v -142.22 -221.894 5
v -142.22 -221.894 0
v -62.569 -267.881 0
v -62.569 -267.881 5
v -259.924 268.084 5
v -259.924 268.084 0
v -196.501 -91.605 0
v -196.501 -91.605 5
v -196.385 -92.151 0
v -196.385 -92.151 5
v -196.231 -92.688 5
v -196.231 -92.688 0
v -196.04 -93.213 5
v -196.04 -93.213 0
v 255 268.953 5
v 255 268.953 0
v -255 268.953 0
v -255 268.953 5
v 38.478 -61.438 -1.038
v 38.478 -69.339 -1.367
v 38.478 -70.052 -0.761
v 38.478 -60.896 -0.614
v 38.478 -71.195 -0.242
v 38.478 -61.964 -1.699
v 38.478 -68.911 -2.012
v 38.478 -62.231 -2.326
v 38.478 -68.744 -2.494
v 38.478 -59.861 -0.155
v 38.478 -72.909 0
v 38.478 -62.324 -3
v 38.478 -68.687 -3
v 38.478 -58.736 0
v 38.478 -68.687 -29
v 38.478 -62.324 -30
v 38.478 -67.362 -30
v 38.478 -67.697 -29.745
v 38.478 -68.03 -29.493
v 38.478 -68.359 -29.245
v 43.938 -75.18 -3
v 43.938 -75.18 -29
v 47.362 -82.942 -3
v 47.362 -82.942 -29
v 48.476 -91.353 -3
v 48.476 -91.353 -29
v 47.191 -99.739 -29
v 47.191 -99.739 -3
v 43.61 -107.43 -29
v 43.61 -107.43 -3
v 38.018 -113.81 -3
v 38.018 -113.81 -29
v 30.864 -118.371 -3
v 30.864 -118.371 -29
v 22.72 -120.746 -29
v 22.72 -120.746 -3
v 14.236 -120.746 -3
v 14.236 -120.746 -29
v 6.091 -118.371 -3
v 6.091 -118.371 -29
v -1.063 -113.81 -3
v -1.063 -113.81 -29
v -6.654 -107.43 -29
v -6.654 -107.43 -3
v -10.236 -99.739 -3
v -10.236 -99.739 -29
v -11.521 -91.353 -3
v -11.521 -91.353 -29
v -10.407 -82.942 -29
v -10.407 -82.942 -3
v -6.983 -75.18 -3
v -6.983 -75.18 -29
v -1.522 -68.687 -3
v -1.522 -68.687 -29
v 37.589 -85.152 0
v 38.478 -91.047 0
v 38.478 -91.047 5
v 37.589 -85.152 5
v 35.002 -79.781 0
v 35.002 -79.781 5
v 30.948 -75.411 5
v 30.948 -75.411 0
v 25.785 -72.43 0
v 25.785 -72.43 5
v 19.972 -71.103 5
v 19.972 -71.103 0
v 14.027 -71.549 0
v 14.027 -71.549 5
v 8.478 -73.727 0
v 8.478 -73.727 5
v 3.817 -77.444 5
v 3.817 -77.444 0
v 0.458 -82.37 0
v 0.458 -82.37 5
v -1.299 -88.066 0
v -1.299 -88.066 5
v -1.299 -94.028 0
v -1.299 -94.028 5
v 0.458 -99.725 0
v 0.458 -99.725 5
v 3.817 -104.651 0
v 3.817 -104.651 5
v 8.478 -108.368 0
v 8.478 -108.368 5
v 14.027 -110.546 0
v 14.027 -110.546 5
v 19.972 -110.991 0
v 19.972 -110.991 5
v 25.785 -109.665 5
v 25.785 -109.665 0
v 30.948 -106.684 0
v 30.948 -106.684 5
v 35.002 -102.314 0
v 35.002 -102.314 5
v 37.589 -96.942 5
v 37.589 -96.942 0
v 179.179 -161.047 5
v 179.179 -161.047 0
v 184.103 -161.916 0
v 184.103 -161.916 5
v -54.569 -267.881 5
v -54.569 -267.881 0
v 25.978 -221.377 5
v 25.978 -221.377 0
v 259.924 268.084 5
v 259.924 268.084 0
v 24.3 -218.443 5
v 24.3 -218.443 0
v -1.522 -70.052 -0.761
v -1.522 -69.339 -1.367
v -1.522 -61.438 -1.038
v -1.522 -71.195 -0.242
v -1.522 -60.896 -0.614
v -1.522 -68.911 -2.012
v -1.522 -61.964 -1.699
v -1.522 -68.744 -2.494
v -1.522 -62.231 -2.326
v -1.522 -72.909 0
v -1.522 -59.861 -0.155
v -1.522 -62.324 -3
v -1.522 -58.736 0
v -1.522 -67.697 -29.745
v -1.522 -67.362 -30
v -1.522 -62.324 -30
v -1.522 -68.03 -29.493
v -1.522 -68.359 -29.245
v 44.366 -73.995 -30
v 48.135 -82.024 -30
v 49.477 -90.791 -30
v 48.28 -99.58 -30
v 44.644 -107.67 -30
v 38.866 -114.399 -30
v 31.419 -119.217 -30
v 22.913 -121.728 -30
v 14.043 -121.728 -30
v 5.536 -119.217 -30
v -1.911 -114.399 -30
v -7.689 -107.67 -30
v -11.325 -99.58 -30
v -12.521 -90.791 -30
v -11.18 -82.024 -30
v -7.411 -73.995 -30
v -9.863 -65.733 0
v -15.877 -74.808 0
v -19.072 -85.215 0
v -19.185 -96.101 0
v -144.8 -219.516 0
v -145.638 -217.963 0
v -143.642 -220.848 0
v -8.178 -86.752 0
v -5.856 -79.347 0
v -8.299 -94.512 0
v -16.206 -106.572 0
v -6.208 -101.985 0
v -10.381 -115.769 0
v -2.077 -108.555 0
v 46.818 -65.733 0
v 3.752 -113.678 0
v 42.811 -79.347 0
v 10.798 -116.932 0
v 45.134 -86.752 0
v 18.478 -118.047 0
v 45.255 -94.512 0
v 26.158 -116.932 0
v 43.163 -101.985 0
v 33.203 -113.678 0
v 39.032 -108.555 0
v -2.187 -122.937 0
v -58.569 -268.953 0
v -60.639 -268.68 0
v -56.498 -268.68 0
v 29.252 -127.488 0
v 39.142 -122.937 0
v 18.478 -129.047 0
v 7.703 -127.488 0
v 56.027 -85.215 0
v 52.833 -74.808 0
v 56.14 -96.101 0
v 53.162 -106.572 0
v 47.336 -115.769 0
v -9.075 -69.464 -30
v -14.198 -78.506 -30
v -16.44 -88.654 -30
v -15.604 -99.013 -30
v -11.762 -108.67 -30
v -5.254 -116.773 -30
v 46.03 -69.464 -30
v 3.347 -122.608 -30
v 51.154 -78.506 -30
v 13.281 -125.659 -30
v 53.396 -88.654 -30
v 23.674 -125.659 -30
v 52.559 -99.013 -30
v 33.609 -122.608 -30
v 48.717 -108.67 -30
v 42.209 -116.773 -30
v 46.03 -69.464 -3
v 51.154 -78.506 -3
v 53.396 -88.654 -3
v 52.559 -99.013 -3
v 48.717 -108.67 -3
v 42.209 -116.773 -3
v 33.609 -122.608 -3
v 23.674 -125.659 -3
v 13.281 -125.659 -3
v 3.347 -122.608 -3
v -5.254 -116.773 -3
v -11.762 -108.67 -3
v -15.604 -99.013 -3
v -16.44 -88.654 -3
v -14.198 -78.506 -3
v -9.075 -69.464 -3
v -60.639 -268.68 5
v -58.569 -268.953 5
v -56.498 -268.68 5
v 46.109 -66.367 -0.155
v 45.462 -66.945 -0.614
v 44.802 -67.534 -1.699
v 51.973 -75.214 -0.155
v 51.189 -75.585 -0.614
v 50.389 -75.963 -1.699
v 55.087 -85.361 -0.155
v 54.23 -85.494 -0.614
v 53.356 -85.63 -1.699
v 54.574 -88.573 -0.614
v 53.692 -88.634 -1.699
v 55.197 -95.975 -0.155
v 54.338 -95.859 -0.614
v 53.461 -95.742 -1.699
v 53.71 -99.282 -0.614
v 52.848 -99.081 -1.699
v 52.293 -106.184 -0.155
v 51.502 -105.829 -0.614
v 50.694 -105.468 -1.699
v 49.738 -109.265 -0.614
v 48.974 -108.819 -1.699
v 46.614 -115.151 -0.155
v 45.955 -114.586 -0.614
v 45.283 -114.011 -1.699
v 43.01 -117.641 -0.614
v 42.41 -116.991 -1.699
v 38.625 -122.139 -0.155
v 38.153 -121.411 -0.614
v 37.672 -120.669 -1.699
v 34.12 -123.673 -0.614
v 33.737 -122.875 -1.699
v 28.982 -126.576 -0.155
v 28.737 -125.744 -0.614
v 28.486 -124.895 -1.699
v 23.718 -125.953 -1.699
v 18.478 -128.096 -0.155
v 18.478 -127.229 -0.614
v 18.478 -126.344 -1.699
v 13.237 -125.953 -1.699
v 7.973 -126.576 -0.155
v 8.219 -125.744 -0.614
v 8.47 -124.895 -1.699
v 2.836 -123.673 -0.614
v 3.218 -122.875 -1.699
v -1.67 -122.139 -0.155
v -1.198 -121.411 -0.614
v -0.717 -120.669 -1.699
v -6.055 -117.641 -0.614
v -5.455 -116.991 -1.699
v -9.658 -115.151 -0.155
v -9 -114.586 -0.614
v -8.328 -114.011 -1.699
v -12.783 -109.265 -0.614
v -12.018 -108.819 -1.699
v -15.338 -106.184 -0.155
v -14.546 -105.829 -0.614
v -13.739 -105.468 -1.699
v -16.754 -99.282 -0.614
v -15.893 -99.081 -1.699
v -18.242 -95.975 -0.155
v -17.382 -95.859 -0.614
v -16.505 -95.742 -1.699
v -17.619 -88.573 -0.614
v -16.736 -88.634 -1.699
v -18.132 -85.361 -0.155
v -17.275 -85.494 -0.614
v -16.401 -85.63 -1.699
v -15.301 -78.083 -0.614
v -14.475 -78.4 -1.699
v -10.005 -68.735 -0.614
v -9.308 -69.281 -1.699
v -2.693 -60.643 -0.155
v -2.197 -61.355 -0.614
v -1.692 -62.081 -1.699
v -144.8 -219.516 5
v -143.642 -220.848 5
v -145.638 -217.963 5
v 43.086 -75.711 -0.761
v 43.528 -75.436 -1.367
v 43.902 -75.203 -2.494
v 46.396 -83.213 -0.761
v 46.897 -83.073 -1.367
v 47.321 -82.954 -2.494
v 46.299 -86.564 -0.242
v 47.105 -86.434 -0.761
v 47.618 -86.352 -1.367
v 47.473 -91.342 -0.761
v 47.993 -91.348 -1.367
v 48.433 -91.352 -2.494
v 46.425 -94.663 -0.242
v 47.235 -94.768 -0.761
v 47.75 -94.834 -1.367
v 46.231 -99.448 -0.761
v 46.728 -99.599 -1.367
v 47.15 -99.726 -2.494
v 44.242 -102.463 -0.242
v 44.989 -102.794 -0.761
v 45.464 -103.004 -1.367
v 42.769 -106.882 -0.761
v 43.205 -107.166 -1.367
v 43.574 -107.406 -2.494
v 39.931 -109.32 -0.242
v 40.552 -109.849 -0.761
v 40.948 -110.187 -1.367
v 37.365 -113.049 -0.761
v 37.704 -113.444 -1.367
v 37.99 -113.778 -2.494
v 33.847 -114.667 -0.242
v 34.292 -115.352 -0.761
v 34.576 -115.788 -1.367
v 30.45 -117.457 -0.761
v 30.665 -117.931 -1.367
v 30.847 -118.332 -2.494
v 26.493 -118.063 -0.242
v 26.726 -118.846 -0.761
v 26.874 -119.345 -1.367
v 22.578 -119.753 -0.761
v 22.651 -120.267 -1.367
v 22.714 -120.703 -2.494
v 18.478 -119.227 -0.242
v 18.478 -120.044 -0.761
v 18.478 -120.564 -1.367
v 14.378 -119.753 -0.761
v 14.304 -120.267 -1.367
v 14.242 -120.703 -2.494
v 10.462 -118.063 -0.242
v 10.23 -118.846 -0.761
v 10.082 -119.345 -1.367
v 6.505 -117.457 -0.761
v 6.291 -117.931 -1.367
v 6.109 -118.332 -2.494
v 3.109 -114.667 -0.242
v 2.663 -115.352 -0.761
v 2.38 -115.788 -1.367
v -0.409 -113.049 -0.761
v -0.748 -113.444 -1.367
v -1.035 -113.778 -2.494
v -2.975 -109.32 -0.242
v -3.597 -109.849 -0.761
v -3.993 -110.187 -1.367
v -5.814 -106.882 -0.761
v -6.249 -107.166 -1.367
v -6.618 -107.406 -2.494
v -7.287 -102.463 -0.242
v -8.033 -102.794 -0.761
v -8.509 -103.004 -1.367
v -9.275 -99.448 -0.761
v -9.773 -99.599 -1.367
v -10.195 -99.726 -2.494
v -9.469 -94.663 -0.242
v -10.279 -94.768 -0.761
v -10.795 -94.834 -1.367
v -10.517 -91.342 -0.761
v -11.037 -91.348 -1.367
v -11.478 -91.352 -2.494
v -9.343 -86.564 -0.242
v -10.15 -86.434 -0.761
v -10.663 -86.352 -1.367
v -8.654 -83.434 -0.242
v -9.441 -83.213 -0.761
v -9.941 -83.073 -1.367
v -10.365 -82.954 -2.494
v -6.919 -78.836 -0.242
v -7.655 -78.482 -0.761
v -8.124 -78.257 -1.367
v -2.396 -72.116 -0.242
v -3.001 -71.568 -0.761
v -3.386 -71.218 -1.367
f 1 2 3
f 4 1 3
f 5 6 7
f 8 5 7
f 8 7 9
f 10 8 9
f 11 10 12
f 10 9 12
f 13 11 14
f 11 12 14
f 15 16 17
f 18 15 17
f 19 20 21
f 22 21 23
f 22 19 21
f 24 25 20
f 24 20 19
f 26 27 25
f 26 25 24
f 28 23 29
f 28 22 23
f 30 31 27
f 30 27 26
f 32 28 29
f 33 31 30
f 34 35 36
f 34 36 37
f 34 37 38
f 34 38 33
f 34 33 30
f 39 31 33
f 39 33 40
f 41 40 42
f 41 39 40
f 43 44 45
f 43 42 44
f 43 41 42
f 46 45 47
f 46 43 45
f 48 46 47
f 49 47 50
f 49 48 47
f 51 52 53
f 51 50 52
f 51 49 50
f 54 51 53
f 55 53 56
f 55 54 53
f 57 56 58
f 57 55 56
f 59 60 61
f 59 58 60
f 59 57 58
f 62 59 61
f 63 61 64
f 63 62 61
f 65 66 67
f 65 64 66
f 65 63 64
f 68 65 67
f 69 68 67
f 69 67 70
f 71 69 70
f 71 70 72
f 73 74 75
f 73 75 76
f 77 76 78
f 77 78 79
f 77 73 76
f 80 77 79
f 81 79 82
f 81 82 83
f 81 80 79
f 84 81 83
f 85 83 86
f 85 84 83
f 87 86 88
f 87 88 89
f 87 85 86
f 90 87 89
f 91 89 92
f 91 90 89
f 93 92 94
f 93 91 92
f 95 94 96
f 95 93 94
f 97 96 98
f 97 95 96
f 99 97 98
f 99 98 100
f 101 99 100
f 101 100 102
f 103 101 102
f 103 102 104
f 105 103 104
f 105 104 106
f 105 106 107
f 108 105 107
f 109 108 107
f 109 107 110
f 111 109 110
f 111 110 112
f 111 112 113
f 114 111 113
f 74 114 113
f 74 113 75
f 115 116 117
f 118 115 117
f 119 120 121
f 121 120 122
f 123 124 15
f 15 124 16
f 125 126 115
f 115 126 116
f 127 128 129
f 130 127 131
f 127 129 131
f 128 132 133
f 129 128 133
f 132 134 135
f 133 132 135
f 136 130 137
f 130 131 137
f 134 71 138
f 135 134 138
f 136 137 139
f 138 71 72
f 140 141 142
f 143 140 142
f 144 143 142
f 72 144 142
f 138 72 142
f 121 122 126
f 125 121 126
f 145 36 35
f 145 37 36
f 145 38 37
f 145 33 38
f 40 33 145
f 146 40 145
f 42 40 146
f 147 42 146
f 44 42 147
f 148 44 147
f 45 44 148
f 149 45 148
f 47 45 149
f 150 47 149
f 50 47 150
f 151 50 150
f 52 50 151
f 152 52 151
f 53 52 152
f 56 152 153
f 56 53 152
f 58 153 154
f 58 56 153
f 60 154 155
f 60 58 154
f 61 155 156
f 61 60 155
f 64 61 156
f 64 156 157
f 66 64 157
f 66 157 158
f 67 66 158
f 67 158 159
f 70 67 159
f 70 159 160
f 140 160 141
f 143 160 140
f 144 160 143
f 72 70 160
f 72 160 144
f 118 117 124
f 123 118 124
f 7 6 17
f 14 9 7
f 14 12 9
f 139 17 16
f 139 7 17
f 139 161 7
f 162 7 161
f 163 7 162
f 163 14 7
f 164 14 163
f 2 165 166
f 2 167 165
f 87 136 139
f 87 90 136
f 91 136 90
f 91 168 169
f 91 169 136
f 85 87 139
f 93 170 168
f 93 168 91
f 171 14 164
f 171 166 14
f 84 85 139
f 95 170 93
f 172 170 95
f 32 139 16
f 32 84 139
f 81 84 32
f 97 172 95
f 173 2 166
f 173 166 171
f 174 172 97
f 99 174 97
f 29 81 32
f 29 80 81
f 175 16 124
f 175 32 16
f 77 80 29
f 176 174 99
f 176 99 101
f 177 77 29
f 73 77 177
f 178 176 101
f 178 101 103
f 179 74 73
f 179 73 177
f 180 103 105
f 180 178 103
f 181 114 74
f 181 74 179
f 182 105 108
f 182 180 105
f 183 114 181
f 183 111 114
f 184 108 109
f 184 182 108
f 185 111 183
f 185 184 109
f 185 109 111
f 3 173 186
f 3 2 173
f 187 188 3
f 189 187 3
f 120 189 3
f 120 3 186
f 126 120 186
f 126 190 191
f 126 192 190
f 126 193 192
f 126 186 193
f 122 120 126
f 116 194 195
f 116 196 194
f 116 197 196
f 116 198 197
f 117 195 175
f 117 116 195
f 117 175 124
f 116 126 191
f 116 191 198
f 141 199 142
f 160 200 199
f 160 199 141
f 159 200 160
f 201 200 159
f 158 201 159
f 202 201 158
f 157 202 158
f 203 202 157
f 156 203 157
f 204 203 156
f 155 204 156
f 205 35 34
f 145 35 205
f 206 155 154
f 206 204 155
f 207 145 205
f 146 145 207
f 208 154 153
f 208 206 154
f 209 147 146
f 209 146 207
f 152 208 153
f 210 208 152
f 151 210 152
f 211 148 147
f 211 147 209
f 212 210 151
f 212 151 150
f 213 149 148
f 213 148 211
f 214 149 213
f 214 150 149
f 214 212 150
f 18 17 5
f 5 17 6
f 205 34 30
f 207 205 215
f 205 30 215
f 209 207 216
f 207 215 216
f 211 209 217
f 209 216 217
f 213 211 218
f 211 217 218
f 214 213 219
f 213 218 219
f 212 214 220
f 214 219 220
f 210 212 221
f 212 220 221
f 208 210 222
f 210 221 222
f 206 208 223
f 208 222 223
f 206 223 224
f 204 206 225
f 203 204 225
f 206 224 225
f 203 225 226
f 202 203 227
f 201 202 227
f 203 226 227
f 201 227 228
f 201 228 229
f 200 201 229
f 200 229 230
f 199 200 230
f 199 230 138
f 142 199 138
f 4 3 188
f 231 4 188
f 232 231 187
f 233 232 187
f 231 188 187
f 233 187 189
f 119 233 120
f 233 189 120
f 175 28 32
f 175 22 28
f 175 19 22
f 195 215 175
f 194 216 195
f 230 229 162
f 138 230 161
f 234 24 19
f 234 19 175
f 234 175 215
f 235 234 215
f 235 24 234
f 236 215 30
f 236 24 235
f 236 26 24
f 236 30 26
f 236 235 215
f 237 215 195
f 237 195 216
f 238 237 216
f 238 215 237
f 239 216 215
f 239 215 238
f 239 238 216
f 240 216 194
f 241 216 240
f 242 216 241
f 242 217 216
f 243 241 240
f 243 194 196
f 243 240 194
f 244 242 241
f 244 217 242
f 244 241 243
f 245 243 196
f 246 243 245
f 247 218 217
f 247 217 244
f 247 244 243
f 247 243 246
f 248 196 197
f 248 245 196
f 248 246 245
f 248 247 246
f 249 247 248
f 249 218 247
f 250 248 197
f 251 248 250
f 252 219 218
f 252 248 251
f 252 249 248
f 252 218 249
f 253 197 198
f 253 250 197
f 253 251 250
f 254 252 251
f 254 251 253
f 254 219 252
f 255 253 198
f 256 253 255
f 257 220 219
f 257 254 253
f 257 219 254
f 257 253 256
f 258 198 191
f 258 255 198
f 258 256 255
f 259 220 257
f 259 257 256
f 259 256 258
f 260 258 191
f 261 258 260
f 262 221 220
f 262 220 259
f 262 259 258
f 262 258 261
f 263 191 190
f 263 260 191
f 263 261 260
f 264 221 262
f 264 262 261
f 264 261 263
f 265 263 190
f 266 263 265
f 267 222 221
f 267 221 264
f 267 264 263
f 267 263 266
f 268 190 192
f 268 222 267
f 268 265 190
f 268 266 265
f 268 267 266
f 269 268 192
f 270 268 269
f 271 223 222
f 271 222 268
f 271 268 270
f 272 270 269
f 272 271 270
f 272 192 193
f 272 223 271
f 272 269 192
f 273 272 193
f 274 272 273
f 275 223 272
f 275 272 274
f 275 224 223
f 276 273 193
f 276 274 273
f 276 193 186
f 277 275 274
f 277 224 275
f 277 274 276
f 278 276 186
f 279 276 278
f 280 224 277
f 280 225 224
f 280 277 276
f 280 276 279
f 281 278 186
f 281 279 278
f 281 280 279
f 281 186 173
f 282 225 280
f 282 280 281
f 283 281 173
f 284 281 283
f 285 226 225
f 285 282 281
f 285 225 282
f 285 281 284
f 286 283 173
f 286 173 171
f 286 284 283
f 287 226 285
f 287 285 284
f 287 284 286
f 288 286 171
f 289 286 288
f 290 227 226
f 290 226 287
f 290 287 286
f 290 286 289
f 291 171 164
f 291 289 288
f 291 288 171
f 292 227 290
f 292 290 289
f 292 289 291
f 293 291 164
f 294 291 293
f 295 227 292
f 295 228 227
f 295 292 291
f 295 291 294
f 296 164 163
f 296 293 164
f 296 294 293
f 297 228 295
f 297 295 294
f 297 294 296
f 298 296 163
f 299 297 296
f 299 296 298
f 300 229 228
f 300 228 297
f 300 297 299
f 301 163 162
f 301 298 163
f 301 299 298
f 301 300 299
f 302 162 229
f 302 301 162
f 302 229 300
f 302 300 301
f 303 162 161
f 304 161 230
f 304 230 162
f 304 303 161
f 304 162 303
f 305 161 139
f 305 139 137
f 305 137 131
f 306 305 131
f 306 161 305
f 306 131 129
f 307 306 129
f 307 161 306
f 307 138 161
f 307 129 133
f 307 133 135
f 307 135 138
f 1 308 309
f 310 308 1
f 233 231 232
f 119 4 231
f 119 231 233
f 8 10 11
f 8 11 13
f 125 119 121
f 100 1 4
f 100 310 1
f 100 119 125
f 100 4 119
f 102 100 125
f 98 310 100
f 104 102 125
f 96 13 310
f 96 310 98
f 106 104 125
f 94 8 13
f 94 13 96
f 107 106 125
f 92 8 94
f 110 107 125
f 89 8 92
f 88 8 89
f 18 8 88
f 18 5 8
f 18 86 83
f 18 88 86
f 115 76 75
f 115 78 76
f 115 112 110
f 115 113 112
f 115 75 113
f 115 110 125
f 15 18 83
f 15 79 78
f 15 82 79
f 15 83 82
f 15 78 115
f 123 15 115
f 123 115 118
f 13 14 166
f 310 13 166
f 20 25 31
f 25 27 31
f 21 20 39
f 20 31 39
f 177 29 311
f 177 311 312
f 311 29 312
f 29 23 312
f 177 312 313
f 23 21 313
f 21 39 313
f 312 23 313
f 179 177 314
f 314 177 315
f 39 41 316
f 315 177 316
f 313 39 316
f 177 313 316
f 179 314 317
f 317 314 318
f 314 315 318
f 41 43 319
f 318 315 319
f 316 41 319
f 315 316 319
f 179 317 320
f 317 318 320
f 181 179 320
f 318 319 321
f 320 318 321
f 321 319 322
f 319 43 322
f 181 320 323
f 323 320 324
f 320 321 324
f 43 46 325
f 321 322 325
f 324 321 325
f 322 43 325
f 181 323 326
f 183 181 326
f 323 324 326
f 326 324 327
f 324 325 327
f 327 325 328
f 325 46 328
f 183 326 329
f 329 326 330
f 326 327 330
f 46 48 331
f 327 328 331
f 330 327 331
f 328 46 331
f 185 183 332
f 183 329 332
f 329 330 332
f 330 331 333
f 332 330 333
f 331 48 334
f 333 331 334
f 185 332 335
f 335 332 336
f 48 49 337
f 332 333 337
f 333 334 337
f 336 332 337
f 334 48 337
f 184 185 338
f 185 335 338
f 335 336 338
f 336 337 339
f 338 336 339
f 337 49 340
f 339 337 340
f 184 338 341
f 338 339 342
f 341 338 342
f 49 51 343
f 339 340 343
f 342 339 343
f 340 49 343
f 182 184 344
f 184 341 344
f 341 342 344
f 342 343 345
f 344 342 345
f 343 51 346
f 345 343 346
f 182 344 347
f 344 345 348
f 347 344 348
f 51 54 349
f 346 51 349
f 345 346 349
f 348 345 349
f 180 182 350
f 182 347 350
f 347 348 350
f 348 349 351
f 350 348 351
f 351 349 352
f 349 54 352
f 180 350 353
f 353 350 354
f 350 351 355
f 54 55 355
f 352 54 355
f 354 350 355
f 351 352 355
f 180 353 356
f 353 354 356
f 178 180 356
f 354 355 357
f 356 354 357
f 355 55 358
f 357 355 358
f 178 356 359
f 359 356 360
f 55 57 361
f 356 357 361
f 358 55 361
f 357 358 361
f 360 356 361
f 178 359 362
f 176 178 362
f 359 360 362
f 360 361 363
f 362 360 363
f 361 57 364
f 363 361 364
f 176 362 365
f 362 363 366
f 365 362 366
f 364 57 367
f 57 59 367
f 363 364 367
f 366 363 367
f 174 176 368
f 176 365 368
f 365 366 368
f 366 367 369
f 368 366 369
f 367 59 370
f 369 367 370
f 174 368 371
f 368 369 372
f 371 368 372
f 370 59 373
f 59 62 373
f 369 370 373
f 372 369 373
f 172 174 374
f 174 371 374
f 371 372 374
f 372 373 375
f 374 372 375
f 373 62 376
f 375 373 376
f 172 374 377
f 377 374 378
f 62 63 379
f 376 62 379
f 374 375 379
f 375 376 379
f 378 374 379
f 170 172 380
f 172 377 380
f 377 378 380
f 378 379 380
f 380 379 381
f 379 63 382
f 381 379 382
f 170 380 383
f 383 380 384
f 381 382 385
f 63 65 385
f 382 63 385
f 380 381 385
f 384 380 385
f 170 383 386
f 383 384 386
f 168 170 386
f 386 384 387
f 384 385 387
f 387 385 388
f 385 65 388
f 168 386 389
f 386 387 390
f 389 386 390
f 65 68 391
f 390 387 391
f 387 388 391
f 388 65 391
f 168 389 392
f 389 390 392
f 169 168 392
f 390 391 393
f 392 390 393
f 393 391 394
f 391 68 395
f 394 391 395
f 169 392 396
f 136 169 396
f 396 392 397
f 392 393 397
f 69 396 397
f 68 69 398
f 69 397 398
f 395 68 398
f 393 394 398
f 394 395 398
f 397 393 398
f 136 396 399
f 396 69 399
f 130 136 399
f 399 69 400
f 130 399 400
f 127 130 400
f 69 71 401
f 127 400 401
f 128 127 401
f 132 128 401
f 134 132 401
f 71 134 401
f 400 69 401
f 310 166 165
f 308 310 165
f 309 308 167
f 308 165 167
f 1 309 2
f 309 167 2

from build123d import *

# Parameters (mm, degrees)
SZKIC1_R                    = 20
DODANIE_WYCI_GNI_CIE1_DEPTH = 5
SZKIC2_R                    = 35
SZKIC2_R_2                  = 30
DODANIE_WYCI_GNI_CIE2_DEPTH = 30
ZAOKR_GLENIE1_R             = 3
SFAZOWANIE1_SIZE            = 1
WYTNIJ_WYCI_GNI_CIE1_REACH  = 377.661
SZKIC3_W                    = 40
SZKIC3_H                    = 30


with BuildPart() as part:
    # Szkic1 → Dodanie-wyciągnięcie1 (new body)
    with BuildSketch(Plane.XY):
        with BuildLine():
            Line((184.10343706, -161.91555121), (259.924038765, 268.08444879))
            Line((259.924038765, 268.08444879), (255, 268.952689679))
            Line((255, 268.952689679), (-255, 268.952689679))
            Line((-255, 268.952689679), (-259.924038765, 268.08444879))
            Line((-259.924038765, 268.08444879), (-196.501079187, -91.605028812))
            ThreePointArc((-196.501079187, -91.605028812), (-196.31271073, -92.420942238), (-196.040087999, -93.212696138))
            Line((-196.040087999, -93.212696138), (-145.637863945, -217.962578277))
            ThreePointArc((-145.637863945, -217.962578277), (-144.258069751, -220.214197762), (-142.220393109, -221.89392876))
            Line((-142.220393109, -221.89392876), (-62.568634717, -267.880892909))
            ThreePointArc((-62.568634717, -267.880892909), (-58.568634717, -268.952689679), (-54.568634717, -267.880892909))
            Line((-54.568634717, -267.880892909), (25.977713055, -221.37743734))
            Line((25.977713055, -221.37743734), (24.300392396, -218.442734314))
            Line((24.300392396, -218.442734314), (179.179398295, -161.047310321))
            Line((179.179398295, -161.047310321), (184.10343706, -161.91555121))
        make_face()
        with Locations((18.477713055, -91.047310321)):
            Circle(SZKIC1_R, mode=Mode.SUBTRACT)
    extrude(amount=DODANIE_WYCI_GNI_CIE1_DEPTH)

    # Szkic2 → Dodanie-wyciągnięcie2 (add)
    with BuildSketch(Plane(origin=(0, 0, 0), x_dir=(-1, 0, 0), z_dir=(0, 0, -1))):
        with Locations(Location((-18.477713055, -91.047310321, 0), (0, 0, 180))):
            Circle(SZKIC2_R)
        with Locations((-18.477713055, -91.047310321)):
            Circle(SZKIC2_R_2, mode=Mode.SUBTRACT)
    extrude(amount=DODANIE_WYCI_GNI_CIE2_DEPTH)

    # Zaokrąglenie1
    zaokr_glenie1_edges = [part.edges().sort_by_distance(p)[0] for p in [
        (-16.522286945, -91.047310321, 0),
        (48.477713055, -91.047310321, 0),
    ]]
    fillet(zaokr_glenie1_edges, radius=ZAOKR_GLENIE1_R)

    # Sfazowanie1
    sfazowanie1_edges = [part.edges().sort_by_distance(p)[0] for p in [
        (48.477713055, -91.047310321, -30),
    ]]
    chamfer(sfazowanie1_edges, length=SFAZOWANIE1_SIZE)

    # Wytnij-wyciągnięcie1: up to this face of the body (flat: up to its plane)
    wytnij_wyci_gni_cie1_end = Plane(part.part.faces().sort_by_distance((-2.974035495, 45.126885672, 0))[0])
    # Szkic3 → Wytnij-wyciągnięcie1 (cut, up to the picked face)
    with BuildSketch(Plane(origin=(0, 0, -30), x_dir=(-1, 0, 0), z_dir=(0, 0, -1)), mode=Mode.PRIVATE) as wytnij_wyci_gni_cie1_sk1:
        with Locations((-18.477713055, -60.047310321)):
            Rectangle(SZKIC3_W, SZKIC3_H)
    wytnij_wyci_gni_cie1_tool1 = split(extrude(wytnij_wyci_gni_cie1_sk1.sketch, amount=-WYTNIJ_WYCI_GNI_CIE1_REACH, mode=Mode.PRIVATE), bisect_by=wytnij_wyci_gni_cie1_end, keep=Keep.BOTH, mode=Mode.PRIVATE)
    add(wytnij_wyci_gni_cie1_tool1.solids().sort_by(Axis((18.477713, -60.04731, -30), (0, 0, 1)))[0], mode=Mode.SUBTRACT)


solid = part.part
